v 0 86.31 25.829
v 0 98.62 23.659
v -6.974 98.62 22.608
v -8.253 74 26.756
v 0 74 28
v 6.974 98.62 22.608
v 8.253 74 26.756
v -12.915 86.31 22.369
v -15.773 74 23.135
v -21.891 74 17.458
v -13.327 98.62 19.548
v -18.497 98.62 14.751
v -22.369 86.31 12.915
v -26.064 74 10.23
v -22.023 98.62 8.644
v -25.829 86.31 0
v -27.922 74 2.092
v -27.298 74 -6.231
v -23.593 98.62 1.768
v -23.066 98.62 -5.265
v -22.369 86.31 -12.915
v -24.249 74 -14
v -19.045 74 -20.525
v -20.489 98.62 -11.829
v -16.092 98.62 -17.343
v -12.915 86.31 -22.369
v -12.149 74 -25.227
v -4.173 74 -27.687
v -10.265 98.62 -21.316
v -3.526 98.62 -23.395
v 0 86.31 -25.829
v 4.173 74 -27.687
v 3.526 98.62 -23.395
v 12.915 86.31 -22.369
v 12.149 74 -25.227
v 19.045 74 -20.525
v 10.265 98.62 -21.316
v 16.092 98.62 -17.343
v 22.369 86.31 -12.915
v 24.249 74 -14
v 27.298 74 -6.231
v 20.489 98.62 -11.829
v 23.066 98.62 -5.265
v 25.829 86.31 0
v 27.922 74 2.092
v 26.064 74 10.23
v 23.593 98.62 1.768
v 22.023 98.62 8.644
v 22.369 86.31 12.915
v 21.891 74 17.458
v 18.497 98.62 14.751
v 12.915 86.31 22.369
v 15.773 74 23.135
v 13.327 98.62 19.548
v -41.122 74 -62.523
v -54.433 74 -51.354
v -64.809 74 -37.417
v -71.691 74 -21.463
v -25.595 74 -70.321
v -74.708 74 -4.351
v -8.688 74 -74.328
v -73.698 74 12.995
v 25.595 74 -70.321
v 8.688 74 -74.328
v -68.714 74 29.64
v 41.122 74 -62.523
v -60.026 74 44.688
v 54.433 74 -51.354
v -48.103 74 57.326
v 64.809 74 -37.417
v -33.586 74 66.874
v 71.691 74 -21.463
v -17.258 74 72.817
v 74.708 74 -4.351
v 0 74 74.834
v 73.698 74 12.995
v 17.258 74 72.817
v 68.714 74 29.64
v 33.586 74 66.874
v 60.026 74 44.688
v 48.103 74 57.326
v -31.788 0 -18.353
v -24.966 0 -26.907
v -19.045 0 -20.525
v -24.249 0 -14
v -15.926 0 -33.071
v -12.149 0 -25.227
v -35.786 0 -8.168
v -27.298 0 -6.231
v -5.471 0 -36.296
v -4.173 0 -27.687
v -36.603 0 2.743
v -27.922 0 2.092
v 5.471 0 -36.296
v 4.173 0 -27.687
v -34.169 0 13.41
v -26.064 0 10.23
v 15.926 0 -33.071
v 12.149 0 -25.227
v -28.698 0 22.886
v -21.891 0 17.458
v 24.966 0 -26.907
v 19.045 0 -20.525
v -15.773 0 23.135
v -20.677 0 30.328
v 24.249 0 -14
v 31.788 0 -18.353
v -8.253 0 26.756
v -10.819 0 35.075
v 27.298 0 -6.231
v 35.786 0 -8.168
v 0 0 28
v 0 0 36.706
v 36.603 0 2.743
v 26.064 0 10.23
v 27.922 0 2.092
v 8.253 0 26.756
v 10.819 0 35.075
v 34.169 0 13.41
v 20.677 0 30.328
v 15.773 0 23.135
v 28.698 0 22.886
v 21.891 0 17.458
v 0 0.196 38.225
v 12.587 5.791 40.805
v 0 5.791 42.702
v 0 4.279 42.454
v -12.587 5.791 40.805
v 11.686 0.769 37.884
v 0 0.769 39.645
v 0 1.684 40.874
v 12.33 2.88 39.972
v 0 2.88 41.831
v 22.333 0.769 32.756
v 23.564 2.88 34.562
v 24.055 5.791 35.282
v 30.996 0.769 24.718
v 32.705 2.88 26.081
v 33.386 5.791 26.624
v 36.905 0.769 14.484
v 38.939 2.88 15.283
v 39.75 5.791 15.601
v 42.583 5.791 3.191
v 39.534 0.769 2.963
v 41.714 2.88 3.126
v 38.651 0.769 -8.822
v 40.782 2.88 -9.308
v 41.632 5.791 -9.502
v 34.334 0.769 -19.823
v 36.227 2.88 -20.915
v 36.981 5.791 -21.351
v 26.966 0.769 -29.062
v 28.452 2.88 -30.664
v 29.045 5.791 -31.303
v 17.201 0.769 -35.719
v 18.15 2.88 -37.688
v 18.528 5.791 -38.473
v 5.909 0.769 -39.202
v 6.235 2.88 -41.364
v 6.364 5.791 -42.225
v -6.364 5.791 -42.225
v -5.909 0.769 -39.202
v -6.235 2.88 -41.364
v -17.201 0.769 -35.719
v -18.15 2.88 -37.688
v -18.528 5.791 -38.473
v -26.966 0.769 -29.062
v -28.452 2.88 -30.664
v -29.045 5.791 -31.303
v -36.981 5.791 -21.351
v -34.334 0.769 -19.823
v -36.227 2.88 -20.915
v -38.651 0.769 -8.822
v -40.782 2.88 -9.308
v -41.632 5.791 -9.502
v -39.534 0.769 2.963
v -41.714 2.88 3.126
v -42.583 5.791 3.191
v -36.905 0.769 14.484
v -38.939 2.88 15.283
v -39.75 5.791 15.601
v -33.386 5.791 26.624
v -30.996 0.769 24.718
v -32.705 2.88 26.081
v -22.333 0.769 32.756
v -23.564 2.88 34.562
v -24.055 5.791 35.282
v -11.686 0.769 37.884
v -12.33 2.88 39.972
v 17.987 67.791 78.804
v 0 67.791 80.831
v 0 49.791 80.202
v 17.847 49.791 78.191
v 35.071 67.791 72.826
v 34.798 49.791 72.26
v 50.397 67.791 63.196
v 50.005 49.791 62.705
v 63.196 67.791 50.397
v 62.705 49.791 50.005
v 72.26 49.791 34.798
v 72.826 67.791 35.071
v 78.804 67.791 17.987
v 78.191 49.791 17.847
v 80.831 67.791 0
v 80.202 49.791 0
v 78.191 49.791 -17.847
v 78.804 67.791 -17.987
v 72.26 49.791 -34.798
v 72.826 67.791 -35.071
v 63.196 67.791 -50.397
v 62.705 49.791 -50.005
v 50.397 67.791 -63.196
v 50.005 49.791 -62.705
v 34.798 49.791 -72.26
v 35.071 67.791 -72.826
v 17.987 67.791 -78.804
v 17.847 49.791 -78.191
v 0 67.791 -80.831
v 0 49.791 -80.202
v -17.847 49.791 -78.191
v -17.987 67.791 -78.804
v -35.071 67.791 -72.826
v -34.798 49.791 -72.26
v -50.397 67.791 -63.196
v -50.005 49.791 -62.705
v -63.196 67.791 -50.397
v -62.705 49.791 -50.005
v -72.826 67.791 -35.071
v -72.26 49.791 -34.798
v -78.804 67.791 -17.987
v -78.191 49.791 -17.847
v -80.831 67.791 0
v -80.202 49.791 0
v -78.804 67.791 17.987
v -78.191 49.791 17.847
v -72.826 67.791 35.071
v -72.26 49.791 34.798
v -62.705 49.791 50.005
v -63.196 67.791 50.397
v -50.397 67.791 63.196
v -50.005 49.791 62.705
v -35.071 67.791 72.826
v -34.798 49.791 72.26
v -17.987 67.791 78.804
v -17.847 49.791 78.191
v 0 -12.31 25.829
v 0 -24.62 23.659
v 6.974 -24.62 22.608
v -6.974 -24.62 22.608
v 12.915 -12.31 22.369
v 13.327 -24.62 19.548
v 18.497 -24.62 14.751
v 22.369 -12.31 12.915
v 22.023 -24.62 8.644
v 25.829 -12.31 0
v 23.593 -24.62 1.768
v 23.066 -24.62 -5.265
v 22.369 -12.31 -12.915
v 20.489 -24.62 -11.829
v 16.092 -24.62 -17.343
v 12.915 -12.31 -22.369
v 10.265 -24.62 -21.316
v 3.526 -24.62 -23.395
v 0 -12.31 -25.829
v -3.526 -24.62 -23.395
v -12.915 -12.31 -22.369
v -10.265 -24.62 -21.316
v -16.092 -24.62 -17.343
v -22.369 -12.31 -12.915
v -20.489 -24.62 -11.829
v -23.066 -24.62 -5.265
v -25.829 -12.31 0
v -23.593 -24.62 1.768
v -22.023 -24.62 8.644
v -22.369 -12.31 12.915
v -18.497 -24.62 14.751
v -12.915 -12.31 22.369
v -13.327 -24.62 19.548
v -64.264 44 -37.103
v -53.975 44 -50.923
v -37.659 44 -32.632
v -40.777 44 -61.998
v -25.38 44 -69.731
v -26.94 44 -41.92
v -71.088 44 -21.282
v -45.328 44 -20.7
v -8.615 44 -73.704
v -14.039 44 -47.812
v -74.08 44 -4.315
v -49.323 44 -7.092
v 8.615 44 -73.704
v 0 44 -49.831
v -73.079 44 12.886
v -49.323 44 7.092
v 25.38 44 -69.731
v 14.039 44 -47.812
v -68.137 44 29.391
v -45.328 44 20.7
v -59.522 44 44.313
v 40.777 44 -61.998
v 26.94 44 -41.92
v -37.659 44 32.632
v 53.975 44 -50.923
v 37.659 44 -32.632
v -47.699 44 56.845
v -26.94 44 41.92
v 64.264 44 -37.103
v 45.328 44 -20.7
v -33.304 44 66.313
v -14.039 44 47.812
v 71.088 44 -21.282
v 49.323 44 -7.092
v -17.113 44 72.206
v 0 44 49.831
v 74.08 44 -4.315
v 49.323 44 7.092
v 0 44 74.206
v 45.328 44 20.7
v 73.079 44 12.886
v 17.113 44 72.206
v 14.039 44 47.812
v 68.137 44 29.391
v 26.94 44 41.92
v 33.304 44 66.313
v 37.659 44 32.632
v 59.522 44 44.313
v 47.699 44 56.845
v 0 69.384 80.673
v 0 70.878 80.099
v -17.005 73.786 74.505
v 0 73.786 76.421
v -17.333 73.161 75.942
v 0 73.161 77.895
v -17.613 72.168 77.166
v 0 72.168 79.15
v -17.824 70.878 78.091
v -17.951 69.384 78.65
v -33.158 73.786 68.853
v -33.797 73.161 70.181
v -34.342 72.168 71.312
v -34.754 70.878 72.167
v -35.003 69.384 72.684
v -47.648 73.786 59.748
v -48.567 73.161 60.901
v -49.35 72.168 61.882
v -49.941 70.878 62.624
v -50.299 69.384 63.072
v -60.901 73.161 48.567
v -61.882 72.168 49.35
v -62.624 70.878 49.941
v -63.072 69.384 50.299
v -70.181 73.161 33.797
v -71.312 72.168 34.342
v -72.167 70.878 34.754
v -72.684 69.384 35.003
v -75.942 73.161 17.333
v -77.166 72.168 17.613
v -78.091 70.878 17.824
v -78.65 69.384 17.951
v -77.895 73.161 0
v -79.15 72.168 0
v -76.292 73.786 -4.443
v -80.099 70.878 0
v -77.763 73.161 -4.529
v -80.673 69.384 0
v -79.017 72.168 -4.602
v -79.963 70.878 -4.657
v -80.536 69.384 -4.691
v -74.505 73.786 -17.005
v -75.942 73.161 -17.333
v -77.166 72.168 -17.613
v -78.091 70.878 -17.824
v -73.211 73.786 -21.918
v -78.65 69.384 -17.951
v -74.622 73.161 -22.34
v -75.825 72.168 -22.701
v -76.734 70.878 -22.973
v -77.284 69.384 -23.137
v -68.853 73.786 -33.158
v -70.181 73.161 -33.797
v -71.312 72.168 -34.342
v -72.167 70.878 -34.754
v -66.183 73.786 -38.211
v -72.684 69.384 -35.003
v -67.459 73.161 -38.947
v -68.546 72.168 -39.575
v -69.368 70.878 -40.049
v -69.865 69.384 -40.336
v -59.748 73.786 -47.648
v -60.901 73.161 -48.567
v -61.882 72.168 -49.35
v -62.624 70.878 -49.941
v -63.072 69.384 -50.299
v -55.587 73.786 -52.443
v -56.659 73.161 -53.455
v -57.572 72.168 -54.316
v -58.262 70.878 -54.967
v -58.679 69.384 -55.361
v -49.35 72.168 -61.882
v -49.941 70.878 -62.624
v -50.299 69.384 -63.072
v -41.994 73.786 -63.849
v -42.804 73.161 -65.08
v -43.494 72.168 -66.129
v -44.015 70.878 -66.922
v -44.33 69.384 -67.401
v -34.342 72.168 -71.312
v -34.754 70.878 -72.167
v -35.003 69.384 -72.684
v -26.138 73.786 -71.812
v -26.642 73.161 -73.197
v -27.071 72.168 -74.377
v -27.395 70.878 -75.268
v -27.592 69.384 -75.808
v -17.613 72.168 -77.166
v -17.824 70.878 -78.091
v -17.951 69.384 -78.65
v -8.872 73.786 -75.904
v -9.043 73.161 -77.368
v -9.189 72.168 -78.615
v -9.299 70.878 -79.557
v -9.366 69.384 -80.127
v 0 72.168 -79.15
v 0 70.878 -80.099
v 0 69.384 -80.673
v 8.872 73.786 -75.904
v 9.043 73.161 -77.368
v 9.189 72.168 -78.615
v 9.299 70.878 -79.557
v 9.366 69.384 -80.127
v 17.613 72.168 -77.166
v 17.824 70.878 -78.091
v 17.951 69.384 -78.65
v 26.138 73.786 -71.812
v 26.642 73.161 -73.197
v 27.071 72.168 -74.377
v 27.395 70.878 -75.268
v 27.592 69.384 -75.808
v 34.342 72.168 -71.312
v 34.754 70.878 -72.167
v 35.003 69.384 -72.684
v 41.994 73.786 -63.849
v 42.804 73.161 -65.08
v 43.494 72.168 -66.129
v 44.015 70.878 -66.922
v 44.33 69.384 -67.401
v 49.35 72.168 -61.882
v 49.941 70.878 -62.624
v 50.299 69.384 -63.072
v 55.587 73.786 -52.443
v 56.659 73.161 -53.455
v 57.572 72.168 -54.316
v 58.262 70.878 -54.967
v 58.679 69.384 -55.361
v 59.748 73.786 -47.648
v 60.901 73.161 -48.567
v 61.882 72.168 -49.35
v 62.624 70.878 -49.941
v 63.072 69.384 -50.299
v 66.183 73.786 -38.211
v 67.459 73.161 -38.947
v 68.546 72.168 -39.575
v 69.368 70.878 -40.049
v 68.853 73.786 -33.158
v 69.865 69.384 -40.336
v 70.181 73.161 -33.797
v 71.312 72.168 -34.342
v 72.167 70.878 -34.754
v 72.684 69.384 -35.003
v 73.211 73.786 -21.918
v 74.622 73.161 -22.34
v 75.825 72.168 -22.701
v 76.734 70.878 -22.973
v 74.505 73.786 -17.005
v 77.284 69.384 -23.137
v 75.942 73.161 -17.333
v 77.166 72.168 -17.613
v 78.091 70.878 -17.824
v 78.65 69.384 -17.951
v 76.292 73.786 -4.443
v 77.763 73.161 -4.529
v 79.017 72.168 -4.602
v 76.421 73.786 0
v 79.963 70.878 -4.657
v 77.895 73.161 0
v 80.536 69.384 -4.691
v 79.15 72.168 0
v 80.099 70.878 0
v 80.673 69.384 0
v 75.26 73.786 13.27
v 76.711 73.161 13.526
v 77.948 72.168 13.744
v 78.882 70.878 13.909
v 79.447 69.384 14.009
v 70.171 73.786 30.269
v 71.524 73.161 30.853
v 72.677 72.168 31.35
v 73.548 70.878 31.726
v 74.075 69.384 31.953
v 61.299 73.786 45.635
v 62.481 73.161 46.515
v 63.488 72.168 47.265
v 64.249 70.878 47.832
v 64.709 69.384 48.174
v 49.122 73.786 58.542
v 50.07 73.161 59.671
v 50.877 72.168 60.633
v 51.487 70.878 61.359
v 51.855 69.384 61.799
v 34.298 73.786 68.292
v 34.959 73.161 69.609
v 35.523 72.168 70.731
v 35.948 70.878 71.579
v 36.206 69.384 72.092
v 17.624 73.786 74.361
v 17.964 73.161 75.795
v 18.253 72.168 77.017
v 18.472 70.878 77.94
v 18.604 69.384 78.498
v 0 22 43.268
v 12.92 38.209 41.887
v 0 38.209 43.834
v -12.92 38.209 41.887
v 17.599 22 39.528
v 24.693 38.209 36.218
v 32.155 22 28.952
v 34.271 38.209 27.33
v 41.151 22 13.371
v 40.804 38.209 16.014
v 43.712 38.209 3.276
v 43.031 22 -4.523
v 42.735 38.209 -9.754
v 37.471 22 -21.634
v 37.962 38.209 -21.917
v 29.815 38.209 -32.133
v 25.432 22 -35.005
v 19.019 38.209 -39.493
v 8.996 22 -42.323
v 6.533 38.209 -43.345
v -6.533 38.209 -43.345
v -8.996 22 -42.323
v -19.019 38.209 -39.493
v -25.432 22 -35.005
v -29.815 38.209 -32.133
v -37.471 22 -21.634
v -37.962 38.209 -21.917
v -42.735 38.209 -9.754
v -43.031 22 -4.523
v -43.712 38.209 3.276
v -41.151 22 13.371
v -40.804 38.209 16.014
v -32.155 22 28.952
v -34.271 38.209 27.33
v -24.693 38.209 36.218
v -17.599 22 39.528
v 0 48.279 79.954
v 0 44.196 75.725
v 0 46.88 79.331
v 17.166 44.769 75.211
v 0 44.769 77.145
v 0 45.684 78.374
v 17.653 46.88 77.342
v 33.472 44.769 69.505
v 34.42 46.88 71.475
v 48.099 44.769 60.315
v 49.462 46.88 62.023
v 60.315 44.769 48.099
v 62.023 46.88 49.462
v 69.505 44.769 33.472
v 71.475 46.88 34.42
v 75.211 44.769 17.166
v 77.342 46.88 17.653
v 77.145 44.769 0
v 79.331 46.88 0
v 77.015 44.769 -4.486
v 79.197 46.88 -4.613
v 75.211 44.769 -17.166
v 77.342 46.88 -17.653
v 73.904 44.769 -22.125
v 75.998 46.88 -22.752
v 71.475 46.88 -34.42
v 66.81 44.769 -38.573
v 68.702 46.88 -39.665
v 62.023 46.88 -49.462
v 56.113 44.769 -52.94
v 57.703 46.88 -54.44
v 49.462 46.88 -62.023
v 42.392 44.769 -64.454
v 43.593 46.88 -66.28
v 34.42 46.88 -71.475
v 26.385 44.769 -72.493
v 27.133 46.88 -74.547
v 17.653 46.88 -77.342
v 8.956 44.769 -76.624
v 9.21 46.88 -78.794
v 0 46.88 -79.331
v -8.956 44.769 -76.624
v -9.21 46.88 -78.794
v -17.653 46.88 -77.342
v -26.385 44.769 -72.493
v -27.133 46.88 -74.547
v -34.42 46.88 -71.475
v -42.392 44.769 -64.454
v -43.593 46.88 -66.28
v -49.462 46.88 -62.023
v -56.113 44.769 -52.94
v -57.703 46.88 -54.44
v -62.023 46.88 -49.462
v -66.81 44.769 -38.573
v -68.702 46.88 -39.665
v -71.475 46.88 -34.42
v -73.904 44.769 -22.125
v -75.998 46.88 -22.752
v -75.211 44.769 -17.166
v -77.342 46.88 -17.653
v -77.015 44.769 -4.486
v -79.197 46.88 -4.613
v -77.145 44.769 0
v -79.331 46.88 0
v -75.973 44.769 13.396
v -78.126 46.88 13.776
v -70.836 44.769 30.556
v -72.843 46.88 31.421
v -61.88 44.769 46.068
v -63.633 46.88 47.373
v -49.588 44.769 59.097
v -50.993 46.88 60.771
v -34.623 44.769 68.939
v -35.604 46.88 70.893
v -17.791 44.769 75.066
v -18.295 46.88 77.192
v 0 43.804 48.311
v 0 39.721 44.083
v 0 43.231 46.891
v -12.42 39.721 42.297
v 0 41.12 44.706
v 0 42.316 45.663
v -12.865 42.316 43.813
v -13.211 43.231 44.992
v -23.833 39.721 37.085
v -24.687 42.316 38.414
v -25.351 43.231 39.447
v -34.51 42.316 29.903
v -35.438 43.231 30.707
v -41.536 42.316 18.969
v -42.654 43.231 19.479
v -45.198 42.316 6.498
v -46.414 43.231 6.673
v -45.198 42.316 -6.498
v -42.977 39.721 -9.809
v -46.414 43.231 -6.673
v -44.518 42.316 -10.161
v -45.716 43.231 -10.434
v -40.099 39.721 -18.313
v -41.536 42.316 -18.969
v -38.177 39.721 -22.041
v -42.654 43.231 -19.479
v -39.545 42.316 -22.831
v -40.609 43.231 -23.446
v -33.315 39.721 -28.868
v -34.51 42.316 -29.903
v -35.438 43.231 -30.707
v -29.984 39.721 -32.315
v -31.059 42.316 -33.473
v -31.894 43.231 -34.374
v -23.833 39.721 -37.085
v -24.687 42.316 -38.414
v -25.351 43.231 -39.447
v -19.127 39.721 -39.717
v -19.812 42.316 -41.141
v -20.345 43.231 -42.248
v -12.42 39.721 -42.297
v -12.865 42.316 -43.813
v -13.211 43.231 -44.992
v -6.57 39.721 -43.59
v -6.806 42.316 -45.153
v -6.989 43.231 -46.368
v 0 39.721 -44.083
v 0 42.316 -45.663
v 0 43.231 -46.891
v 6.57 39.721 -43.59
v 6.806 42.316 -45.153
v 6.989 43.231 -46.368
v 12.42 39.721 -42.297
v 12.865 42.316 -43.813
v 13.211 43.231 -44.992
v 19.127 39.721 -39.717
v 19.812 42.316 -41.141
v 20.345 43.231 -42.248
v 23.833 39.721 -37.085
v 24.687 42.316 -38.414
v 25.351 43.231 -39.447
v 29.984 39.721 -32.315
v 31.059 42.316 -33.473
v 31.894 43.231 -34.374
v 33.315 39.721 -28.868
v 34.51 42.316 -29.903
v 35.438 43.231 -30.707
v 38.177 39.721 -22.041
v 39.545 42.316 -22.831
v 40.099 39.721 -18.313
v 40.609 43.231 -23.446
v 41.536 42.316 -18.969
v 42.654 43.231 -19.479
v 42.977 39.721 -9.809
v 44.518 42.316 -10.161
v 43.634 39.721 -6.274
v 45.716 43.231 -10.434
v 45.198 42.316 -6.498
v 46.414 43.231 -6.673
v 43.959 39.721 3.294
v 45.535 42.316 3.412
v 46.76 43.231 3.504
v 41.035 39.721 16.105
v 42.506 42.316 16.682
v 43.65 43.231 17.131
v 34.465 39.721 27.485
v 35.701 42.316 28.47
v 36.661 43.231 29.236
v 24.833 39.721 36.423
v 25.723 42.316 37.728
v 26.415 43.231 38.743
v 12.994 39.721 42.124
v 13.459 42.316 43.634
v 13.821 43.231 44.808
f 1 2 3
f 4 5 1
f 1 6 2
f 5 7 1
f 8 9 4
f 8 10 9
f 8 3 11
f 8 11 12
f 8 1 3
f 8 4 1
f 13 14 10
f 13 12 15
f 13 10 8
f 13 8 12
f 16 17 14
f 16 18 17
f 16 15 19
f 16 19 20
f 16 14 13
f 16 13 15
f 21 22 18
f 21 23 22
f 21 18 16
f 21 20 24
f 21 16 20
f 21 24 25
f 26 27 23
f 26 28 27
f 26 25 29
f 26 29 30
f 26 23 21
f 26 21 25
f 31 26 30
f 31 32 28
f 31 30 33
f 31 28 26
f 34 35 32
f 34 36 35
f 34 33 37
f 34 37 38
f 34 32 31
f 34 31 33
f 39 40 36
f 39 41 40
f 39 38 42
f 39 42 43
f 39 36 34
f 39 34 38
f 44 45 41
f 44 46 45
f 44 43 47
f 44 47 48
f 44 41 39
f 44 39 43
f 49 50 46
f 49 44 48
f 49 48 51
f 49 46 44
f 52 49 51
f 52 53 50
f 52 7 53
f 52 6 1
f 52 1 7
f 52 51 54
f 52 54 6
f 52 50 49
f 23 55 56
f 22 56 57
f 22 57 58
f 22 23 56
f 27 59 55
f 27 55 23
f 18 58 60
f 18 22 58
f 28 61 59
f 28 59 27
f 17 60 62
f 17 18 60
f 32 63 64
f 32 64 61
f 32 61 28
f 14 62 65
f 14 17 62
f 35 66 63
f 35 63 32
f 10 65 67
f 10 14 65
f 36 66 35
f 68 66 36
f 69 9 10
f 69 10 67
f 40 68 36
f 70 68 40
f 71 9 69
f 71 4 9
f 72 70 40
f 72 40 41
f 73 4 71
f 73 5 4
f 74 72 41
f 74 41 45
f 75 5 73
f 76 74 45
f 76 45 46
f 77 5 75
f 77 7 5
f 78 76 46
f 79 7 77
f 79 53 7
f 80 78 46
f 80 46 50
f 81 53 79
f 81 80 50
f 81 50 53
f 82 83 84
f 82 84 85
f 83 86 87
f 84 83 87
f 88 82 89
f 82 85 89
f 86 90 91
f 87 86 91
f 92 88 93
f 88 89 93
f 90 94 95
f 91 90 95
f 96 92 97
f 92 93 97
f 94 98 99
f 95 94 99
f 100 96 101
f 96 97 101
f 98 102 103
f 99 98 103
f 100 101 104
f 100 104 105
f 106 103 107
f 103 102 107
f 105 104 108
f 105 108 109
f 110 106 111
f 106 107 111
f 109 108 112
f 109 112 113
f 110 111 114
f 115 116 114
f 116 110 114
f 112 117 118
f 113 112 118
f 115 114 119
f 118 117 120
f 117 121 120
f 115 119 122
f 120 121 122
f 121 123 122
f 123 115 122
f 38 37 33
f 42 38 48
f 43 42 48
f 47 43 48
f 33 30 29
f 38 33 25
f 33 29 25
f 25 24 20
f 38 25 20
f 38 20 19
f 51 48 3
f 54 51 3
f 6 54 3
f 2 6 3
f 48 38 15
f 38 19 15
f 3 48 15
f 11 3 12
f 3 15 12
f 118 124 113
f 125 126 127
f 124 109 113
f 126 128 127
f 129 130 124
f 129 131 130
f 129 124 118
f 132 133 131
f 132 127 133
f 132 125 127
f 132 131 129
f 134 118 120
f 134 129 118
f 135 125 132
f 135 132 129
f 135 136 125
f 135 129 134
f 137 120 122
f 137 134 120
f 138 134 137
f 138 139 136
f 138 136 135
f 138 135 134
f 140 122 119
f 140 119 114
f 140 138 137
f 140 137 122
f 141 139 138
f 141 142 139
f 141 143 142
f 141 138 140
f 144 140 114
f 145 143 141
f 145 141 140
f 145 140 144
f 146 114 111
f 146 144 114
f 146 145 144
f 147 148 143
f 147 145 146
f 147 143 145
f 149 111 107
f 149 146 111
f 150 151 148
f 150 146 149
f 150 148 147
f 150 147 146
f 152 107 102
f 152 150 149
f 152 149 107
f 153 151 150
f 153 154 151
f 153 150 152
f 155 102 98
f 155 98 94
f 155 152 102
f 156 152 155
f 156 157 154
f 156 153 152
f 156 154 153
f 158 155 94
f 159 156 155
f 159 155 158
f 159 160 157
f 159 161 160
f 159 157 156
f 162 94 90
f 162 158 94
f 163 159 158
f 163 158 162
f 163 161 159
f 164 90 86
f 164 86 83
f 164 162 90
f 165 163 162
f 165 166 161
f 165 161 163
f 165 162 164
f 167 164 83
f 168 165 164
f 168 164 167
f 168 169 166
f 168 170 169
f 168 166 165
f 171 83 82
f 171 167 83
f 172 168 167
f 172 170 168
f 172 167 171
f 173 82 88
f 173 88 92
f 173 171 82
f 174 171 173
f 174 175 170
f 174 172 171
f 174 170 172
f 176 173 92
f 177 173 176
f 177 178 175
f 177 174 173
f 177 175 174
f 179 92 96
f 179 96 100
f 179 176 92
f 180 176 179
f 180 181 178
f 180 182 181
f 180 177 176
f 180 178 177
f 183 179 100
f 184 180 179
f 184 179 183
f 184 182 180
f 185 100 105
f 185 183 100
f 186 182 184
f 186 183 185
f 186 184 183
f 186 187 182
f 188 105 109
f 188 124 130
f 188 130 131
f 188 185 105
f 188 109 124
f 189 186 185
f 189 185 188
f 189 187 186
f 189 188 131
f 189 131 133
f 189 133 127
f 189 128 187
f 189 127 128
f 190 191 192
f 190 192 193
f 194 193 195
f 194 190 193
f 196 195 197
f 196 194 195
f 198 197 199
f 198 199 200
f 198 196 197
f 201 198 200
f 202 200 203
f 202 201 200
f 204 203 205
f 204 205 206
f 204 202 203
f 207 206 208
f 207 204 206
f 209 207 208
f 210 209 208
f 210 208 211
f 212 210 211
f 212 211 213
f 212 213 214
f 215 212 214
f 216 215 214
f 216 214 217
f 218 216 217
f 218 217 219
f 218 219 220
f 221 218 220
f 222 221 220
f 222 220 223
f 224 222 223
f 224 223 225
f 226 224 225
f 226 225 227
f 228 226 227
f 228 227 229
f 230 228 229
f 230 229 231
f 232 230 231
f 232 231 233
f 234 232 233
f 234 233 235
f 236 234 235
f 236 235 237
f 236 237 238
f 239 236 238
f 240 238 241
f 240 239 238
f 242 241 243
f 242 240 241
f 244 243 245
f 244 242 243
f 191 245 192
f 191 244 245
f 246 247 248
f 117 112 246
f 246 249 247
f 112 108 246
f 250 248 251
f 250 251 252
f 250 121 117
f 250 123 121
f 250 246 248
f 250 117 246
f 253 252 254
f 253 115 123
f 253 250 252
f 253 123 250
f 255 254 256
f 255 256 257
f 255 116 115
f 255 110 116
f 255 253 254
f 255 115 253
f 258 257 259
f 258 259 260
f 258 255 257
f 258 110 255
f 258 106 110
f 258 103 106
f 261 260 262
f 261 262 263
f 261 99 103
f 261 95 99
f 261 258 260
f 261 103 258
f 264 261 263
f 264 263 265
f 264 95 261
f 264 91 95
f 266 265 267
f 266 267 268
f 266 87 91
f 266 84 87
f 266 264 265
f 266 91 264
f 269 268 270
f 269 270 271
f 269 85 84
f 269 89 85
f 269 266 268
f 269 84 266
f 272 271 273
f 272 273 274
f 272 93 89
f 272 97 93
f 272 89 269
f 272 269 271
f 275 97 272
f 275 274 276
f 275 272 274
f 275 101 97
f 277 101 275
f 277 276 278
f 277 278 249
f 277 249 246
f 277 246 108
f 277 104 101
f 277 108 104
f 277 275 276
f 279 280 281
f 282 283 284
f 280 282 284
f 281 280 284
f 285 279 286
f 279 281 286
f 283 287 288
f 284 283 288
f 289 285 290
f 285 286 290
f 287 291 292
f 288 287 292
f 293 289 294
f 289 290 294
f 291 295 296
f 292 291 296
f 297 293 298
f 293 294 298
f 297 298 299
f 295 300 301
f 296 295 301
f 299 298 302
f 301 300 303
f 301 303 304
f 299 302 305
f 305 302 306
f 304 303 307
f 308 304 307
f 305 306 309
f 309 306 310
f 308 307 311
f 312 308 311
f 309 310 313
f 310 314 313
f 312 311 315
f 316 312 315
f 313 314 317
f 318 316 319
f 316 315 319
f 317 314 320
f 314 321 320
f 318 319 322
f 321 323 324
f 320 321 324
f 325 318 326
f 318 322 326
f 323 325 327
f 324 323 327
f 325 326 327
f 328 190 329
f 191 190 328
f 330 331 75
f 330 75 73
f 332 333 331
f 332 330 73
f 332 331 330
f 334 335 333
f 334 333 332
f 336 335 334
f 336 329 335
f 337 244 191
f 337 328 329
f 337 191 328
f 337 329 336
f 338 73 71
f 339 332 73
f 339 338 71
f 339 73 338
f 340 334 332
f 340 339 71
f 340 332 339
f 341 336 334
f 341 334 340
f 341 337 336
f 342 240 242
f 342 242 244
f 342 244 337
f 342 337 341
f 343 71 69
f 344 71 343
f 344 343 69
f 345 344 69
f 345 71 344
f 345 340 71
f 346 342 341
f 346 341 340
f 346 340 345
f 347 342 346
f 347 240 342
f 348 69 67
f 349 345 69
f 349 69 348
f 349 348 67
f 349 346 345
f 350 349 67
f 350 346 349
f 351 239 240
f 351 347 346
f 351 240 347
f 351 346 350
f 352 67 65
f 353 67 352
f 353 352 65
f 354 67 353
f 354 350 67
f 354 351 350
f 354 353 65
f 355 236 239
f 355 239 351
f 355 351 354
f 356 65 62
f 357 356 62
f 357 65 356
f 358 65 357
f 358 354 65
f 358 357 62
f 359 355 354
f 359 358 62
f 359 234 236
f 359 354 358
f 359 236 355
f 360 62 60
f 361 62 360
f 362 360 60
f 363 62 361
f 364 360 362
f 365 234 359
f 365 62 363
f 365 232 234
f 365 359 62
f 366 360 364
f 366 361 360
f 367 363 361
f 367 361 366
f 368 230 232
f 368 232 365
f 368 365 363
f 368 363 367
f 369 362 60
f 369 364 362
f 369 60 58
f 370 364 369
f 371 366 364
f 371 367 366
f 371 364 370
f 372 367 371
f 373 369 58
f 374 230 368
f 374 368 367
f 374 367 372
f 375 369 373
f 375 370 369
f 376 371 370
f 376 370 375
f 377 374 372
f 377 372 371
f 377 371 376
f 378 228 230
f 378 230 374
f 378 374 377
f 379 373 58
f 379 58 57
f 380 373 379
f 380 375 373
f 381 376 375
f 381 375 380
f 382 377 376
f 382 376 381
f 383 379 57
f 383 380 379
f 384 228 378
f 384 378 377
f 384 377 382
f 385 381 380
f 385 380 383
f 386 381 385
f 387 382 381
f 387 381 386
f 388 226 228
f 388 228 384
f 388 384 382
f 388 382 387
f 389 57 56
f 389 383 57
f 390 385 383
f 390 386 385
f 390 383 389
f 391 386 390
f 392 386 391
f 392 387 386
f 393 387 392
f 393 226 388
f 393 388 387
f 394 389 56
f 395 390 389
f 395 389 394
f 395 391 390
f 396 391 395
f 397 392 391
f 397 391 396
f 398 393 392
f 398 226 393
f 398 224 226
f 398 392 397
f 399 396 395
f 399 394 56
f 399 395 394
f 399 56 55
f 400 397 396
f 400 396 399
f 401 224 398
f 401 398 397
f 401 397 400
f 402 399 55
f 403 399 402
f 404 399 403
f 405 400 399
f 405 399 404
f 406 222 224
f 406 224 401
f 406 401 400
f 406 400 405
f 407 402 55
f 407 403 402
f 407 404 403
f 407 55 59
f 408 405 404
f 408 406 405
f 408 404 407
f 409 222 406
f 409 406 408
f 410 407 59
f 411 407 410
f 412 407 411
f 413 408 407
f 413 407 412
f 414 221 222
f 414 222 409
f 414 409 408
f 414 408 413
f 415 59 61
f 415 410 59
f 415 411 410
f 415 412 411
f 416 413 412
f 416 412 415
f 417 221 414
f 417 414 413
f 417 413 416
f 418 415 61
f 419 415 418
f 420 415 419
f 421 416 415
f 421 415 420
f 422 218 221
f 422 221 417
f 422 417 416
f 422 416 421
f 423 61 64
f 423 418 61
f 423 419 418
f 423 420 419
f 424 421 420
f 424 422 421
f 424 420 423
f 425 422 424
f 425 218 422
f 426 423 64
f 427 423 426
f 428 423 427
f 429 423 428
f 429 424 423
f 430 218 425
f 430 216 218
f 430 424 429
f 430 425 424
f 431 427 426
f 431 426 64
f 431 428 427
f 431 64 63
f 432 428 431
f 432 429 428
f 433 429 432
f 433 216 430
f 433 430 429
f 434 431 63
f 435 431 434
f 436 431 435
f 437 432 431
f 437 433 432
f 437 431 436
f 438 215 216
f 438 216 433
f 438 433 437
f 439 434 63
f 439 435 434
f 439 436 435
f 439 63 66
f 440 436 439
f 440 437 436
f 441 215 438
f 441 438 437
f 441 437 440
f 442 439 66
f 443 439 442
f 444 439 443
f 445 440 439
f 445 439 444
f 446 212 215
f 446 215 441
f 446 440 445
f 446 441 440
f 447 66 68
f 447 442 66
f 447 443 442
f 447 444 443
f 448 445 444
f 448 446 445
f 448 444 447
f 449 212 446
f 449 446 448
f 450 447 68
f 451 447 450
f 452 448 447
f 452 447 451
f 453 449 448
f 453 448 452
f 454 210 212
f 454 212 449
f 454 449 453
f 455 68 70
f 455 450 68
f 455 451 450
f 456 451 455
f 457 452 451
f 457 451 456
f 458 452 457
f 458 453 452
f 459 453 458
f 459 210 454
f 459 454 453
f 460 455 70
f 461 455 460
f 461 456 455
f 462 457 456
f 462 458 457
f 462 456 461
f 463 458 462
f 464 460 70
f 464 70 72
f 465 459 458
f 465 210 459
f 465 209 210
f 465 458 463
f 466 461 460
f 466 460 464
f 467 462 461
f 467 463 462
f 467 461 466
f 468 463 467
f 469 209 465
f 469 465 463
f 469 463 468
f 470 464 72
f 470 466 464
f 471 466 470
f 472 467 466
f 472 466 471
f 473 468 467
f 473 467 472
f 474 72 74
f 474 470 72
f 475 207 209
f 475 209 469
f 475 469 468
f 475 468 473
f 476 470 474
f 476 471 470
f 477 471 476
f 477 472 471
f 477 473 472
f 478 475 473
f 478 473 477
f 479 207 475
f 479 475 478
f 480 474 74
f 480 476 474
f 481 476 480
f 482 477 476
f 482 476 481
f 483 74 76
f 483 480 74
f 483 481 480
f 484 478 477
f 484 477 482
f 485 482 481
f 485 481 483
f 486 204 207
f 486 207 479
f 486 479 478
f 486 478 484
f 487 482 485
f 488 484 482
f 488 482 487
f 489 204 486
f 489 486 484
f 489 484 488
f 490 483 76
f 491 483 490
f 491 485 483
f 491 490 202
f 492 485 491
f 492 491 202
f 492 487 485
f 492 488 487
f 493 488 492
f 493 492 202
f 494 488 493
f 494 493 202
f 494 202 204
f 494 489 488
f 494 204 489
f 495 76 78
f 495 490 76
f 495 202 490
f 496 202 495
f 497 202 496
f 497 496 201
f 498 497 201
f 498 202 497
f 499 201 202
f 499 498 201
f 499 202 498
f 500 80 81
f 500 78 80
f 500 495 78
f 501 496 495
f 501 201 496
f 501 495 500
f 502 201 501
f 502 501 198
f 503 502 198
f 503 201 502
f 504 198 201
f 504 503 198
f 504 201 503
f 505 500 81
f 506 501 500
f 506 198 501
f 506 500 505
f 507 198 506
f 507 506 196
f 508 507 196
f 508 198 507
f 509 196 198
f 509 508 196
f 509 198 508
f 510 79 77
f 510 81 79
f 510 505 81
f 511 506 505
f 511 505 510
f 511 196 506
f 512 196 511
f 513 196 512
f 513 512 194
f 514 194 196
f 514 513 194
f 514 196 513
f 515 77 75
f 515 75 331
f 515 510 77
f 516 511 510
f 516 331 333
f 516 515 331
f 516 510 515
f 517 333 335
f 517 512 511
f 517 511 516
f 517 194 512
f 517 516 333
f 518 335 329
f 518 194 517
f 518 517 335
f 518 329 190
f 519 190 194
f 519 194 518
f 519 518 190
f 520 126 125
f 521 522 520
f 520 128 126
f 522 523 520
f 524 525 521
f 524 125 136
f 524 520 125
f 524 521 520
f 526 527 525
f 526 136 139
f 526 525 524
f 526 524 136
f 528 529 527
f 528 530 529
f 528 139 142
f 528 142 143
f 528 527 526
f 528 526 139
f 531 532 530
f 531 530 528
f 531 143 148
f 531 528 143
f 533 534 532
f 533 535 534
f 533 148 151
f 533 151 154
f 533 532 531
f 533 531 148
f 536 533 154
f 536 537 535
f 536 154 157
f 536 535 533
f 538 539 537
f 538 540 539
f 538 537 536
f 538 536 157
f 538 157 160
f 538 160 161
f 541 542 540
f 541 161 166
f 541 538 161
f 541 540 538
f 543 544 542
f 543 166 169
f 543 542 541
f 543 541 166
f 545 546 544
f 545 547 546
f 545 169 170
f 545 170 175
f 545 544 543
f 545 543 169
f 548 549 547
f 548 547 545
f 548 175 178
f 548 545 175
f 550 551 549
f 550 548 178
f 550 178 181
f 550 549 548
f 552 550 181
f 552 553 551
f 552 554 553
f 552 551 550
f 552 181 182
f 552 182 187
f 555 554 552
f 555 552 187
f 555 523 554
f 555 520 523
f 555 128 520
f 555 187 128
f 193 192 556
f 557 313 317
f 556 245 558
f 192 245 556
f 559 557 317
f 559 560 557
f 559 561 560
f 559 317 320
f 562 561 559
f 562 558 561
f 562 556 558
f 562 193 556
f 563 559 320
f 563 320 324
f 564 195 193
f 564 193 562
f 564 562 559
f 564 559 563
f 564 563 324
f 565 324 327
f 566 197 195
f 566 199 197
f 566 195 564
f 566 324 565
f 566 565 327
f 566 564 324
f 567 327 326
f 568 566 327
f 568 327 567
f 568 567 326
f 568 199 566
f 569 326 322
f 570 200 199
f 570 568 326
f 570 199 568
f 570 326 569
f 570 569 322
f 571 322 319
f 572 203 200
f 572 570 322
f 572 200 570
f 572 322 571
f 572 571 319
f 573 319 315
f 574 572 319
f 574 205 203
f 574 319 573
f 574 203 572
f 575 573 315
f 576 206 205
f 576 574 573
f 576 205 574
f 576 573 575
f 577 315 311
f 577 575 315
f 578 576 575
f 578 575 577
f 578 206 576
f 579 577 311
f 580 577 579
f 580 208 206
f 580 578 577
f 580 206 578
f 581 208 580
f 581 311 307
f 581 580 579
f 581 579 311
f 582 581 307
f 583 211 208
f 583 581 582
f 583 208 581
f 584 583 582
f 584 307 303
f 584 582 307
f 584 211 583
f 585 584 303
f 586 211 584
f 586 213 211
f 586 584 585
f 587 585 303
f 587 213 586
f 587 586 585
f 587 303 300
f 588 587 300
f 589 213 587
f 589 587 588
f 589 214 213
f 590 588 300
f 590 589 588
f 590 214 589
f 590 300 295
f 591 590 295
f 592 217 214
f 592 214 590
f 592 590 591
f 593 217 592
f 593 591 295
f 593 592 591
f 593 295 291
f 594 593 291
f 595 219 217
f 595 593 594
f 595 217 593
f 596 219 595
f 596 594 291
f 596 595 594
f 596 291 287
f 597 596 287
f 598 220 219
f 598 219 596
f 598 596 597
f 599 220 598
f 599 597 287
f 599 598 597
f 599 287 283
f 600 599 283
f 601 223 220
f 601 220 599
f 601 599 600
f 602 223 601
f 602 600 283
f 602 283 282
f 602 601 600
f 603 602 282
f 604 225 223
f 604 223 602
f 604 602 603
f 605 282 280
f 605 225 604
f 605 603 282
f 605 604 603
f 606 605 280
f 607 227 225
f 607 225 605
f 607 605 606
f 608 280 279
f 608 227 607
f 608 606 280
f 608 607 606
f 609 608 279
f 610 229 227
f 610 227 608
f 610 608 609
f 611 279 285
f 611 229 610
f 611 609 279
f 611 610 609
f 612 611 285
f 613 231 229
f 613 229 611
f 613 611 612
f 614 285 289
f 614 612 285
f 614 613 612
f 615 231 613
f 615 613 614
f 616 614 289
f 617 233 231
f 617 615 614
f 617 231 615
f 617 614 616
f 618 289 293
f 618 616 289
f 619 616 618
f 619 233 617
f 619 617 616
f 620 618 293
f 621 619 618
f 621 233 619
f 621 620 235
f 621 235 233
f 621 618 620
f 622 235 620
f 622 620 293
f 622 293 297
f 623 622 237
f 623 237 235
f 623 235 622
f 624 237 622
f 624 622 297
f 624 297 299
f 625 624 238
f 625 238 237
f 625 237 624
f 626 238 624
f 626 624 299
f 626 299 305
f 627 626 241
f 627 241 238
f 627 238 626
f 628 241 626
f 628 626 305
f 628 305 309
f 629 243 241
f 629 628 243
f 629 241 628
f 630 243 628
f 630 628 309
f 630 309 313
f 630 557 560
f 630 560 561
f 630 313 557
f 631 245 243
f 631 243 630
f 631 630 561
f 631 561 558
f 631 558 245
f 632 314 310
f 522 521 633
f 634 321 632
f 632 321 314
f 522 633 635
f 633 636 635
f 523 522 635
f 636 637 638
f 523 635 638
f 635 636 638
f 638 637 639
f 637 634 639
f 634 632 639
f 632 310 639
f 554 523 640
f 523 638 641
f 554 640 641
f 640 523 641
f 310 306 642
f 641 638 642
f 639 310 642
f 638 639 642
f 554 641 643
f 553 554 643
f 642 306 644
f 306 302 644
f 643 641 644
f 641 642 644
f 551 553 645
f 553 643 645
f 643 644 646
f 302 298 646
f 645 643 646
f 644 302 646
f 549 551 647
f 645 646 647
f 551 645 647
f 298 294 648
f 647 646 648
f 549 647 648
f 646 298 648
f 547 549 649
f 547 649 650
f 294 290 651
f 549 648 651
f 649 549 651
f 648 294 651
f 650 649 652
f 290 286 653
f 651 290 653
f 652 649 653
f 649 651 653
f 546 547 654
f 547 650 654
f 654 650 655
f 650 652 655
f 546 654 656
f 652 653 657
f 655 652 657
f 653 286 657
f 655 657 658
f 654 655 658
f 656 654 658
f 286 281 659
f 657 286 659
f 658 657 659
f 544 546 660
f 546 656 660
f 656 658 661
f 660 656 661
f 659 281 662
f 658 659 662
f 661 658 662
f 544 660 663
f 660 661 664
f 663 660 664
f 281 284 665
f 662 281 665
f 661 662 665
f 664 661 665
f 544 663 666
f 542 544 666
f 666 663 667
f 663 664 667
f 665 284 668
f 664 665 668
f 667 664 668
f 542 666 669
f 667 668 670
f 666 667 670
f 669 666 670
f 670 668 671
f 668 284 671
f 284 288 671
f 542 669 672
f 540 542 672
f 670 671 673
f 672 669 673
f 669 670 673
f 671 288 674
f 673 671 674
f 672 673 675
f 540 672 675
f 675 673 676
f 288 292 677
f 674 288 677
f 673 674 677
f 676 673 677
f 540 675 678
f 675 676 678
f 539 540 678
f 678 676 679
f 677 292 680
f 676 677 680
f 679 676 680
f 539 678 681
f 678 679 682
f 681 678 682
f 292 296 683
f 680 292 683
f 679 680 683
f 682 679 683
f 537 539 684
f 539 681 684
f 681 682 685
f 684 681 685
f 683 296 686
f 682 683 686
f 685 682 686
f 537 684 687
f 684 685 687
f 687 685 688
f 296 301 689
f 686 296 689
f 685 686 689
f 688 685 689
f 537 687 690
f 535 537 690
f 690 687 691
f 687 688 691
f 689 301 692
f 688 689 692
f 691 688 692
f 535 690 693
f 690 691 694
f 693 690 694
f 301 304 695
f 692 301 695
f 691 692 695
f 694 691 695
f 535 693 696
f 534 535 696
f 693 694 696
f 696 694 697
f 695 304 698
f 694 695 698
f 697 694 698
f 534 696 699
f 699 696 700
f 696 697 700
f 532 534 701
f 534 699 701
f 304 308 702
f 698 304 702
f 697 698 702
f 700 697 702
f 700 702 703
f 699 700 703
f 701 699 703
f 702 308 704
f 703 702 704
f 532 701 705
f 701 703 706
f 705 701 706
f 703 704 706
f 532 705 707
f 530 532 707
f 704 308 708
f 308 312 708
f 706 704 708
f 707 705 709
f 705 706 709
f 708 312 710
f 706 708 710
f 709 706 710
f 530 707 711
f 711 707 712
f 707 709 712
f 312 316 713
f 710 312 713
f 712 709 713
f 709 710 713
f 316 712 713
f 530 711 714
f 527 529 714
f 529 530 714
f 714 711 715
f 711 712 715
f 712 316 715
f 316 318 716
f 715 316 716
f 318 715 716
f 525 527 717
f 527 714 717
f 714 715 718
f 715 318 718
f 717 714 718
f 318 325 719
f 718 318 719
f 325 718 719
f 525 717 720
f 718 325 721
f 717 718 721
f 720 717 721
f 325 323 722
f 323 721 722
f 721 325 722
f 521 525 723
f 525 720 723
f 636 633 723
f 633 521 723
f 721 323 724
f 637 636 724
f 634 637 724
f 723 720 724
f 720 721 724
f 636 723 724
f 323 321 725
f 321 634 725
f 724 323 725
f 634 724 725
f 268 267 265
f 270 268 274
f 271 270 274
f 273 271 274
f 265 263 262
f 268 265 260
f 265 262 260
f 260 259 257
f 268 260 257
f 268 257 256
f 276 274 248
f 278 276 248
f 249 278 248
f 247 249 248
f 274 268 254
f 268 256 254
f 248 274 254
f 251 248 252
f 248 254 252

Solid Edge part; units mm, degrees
sketch "Sketch1" plane through (0, 0, 0) normal (1, 0, 0) x (0, 1, 0)
  line L0 (74, 81.0476) -> (74, 0)
  line L1 (44, 80) -> (74, 81.0476)
  line L2 (44, 80) -> (44, 44.0365)
  line L3 (0, 42.5) -> (44, 44.0365)
  line L4 (0, 42.5) -> (0, 0)
  dimension "D1" = 42.5
  dimension "D2" = 35.9635
  dimension "D3" = 81.0476
  dimension "D4" = 30.0183
  dimension "D5" = 44.0268
revolve "RevolvedProtrusion1" add sketch "Sketch1" angle 360 about axis through (0, 0, 0) along (0, 1, 0)
fillet "Raccordi_grezzo" radius 6 4 edges at (0, 74, 81.0476) (0, 44, 80) (0, 44, 44.0365) (0, 0, 42.5)
sketch "Sketch2" plane through (0, 0, 0) normal (-1, 0, 0) x (0, -1, 0)
  line L0 (0, 0) -> (0, 28)
  line L1 (0, 28) -> (24.6202, 23.6588)
  line L2 (24.6202, 23.6588) -> (24.6202, 0)
revolve "RevolvedProtrusion2" add sketch "Sketch2" angle 360 about axis through (0, -24.6202, 0) along (0, 1, 0)
sketch "Sketch3" plane through (0, 0, 0) normal (-1, 0, 0) x (0, -1, 0)
  line L0 (-74, 0) -> (-74, 28)
  line L1 (-74, 28) -> (-98.6202, 23.6588)
  line L2 (-98.6202, 23.6588) -> (-98.6202, 0)
revolve "RevolvedProtrusion3" add sketch "Sketch3" angle 360 about axis through (0, 98.6202, 0) along (0, -1, 0)
properties material "Acciaio"
